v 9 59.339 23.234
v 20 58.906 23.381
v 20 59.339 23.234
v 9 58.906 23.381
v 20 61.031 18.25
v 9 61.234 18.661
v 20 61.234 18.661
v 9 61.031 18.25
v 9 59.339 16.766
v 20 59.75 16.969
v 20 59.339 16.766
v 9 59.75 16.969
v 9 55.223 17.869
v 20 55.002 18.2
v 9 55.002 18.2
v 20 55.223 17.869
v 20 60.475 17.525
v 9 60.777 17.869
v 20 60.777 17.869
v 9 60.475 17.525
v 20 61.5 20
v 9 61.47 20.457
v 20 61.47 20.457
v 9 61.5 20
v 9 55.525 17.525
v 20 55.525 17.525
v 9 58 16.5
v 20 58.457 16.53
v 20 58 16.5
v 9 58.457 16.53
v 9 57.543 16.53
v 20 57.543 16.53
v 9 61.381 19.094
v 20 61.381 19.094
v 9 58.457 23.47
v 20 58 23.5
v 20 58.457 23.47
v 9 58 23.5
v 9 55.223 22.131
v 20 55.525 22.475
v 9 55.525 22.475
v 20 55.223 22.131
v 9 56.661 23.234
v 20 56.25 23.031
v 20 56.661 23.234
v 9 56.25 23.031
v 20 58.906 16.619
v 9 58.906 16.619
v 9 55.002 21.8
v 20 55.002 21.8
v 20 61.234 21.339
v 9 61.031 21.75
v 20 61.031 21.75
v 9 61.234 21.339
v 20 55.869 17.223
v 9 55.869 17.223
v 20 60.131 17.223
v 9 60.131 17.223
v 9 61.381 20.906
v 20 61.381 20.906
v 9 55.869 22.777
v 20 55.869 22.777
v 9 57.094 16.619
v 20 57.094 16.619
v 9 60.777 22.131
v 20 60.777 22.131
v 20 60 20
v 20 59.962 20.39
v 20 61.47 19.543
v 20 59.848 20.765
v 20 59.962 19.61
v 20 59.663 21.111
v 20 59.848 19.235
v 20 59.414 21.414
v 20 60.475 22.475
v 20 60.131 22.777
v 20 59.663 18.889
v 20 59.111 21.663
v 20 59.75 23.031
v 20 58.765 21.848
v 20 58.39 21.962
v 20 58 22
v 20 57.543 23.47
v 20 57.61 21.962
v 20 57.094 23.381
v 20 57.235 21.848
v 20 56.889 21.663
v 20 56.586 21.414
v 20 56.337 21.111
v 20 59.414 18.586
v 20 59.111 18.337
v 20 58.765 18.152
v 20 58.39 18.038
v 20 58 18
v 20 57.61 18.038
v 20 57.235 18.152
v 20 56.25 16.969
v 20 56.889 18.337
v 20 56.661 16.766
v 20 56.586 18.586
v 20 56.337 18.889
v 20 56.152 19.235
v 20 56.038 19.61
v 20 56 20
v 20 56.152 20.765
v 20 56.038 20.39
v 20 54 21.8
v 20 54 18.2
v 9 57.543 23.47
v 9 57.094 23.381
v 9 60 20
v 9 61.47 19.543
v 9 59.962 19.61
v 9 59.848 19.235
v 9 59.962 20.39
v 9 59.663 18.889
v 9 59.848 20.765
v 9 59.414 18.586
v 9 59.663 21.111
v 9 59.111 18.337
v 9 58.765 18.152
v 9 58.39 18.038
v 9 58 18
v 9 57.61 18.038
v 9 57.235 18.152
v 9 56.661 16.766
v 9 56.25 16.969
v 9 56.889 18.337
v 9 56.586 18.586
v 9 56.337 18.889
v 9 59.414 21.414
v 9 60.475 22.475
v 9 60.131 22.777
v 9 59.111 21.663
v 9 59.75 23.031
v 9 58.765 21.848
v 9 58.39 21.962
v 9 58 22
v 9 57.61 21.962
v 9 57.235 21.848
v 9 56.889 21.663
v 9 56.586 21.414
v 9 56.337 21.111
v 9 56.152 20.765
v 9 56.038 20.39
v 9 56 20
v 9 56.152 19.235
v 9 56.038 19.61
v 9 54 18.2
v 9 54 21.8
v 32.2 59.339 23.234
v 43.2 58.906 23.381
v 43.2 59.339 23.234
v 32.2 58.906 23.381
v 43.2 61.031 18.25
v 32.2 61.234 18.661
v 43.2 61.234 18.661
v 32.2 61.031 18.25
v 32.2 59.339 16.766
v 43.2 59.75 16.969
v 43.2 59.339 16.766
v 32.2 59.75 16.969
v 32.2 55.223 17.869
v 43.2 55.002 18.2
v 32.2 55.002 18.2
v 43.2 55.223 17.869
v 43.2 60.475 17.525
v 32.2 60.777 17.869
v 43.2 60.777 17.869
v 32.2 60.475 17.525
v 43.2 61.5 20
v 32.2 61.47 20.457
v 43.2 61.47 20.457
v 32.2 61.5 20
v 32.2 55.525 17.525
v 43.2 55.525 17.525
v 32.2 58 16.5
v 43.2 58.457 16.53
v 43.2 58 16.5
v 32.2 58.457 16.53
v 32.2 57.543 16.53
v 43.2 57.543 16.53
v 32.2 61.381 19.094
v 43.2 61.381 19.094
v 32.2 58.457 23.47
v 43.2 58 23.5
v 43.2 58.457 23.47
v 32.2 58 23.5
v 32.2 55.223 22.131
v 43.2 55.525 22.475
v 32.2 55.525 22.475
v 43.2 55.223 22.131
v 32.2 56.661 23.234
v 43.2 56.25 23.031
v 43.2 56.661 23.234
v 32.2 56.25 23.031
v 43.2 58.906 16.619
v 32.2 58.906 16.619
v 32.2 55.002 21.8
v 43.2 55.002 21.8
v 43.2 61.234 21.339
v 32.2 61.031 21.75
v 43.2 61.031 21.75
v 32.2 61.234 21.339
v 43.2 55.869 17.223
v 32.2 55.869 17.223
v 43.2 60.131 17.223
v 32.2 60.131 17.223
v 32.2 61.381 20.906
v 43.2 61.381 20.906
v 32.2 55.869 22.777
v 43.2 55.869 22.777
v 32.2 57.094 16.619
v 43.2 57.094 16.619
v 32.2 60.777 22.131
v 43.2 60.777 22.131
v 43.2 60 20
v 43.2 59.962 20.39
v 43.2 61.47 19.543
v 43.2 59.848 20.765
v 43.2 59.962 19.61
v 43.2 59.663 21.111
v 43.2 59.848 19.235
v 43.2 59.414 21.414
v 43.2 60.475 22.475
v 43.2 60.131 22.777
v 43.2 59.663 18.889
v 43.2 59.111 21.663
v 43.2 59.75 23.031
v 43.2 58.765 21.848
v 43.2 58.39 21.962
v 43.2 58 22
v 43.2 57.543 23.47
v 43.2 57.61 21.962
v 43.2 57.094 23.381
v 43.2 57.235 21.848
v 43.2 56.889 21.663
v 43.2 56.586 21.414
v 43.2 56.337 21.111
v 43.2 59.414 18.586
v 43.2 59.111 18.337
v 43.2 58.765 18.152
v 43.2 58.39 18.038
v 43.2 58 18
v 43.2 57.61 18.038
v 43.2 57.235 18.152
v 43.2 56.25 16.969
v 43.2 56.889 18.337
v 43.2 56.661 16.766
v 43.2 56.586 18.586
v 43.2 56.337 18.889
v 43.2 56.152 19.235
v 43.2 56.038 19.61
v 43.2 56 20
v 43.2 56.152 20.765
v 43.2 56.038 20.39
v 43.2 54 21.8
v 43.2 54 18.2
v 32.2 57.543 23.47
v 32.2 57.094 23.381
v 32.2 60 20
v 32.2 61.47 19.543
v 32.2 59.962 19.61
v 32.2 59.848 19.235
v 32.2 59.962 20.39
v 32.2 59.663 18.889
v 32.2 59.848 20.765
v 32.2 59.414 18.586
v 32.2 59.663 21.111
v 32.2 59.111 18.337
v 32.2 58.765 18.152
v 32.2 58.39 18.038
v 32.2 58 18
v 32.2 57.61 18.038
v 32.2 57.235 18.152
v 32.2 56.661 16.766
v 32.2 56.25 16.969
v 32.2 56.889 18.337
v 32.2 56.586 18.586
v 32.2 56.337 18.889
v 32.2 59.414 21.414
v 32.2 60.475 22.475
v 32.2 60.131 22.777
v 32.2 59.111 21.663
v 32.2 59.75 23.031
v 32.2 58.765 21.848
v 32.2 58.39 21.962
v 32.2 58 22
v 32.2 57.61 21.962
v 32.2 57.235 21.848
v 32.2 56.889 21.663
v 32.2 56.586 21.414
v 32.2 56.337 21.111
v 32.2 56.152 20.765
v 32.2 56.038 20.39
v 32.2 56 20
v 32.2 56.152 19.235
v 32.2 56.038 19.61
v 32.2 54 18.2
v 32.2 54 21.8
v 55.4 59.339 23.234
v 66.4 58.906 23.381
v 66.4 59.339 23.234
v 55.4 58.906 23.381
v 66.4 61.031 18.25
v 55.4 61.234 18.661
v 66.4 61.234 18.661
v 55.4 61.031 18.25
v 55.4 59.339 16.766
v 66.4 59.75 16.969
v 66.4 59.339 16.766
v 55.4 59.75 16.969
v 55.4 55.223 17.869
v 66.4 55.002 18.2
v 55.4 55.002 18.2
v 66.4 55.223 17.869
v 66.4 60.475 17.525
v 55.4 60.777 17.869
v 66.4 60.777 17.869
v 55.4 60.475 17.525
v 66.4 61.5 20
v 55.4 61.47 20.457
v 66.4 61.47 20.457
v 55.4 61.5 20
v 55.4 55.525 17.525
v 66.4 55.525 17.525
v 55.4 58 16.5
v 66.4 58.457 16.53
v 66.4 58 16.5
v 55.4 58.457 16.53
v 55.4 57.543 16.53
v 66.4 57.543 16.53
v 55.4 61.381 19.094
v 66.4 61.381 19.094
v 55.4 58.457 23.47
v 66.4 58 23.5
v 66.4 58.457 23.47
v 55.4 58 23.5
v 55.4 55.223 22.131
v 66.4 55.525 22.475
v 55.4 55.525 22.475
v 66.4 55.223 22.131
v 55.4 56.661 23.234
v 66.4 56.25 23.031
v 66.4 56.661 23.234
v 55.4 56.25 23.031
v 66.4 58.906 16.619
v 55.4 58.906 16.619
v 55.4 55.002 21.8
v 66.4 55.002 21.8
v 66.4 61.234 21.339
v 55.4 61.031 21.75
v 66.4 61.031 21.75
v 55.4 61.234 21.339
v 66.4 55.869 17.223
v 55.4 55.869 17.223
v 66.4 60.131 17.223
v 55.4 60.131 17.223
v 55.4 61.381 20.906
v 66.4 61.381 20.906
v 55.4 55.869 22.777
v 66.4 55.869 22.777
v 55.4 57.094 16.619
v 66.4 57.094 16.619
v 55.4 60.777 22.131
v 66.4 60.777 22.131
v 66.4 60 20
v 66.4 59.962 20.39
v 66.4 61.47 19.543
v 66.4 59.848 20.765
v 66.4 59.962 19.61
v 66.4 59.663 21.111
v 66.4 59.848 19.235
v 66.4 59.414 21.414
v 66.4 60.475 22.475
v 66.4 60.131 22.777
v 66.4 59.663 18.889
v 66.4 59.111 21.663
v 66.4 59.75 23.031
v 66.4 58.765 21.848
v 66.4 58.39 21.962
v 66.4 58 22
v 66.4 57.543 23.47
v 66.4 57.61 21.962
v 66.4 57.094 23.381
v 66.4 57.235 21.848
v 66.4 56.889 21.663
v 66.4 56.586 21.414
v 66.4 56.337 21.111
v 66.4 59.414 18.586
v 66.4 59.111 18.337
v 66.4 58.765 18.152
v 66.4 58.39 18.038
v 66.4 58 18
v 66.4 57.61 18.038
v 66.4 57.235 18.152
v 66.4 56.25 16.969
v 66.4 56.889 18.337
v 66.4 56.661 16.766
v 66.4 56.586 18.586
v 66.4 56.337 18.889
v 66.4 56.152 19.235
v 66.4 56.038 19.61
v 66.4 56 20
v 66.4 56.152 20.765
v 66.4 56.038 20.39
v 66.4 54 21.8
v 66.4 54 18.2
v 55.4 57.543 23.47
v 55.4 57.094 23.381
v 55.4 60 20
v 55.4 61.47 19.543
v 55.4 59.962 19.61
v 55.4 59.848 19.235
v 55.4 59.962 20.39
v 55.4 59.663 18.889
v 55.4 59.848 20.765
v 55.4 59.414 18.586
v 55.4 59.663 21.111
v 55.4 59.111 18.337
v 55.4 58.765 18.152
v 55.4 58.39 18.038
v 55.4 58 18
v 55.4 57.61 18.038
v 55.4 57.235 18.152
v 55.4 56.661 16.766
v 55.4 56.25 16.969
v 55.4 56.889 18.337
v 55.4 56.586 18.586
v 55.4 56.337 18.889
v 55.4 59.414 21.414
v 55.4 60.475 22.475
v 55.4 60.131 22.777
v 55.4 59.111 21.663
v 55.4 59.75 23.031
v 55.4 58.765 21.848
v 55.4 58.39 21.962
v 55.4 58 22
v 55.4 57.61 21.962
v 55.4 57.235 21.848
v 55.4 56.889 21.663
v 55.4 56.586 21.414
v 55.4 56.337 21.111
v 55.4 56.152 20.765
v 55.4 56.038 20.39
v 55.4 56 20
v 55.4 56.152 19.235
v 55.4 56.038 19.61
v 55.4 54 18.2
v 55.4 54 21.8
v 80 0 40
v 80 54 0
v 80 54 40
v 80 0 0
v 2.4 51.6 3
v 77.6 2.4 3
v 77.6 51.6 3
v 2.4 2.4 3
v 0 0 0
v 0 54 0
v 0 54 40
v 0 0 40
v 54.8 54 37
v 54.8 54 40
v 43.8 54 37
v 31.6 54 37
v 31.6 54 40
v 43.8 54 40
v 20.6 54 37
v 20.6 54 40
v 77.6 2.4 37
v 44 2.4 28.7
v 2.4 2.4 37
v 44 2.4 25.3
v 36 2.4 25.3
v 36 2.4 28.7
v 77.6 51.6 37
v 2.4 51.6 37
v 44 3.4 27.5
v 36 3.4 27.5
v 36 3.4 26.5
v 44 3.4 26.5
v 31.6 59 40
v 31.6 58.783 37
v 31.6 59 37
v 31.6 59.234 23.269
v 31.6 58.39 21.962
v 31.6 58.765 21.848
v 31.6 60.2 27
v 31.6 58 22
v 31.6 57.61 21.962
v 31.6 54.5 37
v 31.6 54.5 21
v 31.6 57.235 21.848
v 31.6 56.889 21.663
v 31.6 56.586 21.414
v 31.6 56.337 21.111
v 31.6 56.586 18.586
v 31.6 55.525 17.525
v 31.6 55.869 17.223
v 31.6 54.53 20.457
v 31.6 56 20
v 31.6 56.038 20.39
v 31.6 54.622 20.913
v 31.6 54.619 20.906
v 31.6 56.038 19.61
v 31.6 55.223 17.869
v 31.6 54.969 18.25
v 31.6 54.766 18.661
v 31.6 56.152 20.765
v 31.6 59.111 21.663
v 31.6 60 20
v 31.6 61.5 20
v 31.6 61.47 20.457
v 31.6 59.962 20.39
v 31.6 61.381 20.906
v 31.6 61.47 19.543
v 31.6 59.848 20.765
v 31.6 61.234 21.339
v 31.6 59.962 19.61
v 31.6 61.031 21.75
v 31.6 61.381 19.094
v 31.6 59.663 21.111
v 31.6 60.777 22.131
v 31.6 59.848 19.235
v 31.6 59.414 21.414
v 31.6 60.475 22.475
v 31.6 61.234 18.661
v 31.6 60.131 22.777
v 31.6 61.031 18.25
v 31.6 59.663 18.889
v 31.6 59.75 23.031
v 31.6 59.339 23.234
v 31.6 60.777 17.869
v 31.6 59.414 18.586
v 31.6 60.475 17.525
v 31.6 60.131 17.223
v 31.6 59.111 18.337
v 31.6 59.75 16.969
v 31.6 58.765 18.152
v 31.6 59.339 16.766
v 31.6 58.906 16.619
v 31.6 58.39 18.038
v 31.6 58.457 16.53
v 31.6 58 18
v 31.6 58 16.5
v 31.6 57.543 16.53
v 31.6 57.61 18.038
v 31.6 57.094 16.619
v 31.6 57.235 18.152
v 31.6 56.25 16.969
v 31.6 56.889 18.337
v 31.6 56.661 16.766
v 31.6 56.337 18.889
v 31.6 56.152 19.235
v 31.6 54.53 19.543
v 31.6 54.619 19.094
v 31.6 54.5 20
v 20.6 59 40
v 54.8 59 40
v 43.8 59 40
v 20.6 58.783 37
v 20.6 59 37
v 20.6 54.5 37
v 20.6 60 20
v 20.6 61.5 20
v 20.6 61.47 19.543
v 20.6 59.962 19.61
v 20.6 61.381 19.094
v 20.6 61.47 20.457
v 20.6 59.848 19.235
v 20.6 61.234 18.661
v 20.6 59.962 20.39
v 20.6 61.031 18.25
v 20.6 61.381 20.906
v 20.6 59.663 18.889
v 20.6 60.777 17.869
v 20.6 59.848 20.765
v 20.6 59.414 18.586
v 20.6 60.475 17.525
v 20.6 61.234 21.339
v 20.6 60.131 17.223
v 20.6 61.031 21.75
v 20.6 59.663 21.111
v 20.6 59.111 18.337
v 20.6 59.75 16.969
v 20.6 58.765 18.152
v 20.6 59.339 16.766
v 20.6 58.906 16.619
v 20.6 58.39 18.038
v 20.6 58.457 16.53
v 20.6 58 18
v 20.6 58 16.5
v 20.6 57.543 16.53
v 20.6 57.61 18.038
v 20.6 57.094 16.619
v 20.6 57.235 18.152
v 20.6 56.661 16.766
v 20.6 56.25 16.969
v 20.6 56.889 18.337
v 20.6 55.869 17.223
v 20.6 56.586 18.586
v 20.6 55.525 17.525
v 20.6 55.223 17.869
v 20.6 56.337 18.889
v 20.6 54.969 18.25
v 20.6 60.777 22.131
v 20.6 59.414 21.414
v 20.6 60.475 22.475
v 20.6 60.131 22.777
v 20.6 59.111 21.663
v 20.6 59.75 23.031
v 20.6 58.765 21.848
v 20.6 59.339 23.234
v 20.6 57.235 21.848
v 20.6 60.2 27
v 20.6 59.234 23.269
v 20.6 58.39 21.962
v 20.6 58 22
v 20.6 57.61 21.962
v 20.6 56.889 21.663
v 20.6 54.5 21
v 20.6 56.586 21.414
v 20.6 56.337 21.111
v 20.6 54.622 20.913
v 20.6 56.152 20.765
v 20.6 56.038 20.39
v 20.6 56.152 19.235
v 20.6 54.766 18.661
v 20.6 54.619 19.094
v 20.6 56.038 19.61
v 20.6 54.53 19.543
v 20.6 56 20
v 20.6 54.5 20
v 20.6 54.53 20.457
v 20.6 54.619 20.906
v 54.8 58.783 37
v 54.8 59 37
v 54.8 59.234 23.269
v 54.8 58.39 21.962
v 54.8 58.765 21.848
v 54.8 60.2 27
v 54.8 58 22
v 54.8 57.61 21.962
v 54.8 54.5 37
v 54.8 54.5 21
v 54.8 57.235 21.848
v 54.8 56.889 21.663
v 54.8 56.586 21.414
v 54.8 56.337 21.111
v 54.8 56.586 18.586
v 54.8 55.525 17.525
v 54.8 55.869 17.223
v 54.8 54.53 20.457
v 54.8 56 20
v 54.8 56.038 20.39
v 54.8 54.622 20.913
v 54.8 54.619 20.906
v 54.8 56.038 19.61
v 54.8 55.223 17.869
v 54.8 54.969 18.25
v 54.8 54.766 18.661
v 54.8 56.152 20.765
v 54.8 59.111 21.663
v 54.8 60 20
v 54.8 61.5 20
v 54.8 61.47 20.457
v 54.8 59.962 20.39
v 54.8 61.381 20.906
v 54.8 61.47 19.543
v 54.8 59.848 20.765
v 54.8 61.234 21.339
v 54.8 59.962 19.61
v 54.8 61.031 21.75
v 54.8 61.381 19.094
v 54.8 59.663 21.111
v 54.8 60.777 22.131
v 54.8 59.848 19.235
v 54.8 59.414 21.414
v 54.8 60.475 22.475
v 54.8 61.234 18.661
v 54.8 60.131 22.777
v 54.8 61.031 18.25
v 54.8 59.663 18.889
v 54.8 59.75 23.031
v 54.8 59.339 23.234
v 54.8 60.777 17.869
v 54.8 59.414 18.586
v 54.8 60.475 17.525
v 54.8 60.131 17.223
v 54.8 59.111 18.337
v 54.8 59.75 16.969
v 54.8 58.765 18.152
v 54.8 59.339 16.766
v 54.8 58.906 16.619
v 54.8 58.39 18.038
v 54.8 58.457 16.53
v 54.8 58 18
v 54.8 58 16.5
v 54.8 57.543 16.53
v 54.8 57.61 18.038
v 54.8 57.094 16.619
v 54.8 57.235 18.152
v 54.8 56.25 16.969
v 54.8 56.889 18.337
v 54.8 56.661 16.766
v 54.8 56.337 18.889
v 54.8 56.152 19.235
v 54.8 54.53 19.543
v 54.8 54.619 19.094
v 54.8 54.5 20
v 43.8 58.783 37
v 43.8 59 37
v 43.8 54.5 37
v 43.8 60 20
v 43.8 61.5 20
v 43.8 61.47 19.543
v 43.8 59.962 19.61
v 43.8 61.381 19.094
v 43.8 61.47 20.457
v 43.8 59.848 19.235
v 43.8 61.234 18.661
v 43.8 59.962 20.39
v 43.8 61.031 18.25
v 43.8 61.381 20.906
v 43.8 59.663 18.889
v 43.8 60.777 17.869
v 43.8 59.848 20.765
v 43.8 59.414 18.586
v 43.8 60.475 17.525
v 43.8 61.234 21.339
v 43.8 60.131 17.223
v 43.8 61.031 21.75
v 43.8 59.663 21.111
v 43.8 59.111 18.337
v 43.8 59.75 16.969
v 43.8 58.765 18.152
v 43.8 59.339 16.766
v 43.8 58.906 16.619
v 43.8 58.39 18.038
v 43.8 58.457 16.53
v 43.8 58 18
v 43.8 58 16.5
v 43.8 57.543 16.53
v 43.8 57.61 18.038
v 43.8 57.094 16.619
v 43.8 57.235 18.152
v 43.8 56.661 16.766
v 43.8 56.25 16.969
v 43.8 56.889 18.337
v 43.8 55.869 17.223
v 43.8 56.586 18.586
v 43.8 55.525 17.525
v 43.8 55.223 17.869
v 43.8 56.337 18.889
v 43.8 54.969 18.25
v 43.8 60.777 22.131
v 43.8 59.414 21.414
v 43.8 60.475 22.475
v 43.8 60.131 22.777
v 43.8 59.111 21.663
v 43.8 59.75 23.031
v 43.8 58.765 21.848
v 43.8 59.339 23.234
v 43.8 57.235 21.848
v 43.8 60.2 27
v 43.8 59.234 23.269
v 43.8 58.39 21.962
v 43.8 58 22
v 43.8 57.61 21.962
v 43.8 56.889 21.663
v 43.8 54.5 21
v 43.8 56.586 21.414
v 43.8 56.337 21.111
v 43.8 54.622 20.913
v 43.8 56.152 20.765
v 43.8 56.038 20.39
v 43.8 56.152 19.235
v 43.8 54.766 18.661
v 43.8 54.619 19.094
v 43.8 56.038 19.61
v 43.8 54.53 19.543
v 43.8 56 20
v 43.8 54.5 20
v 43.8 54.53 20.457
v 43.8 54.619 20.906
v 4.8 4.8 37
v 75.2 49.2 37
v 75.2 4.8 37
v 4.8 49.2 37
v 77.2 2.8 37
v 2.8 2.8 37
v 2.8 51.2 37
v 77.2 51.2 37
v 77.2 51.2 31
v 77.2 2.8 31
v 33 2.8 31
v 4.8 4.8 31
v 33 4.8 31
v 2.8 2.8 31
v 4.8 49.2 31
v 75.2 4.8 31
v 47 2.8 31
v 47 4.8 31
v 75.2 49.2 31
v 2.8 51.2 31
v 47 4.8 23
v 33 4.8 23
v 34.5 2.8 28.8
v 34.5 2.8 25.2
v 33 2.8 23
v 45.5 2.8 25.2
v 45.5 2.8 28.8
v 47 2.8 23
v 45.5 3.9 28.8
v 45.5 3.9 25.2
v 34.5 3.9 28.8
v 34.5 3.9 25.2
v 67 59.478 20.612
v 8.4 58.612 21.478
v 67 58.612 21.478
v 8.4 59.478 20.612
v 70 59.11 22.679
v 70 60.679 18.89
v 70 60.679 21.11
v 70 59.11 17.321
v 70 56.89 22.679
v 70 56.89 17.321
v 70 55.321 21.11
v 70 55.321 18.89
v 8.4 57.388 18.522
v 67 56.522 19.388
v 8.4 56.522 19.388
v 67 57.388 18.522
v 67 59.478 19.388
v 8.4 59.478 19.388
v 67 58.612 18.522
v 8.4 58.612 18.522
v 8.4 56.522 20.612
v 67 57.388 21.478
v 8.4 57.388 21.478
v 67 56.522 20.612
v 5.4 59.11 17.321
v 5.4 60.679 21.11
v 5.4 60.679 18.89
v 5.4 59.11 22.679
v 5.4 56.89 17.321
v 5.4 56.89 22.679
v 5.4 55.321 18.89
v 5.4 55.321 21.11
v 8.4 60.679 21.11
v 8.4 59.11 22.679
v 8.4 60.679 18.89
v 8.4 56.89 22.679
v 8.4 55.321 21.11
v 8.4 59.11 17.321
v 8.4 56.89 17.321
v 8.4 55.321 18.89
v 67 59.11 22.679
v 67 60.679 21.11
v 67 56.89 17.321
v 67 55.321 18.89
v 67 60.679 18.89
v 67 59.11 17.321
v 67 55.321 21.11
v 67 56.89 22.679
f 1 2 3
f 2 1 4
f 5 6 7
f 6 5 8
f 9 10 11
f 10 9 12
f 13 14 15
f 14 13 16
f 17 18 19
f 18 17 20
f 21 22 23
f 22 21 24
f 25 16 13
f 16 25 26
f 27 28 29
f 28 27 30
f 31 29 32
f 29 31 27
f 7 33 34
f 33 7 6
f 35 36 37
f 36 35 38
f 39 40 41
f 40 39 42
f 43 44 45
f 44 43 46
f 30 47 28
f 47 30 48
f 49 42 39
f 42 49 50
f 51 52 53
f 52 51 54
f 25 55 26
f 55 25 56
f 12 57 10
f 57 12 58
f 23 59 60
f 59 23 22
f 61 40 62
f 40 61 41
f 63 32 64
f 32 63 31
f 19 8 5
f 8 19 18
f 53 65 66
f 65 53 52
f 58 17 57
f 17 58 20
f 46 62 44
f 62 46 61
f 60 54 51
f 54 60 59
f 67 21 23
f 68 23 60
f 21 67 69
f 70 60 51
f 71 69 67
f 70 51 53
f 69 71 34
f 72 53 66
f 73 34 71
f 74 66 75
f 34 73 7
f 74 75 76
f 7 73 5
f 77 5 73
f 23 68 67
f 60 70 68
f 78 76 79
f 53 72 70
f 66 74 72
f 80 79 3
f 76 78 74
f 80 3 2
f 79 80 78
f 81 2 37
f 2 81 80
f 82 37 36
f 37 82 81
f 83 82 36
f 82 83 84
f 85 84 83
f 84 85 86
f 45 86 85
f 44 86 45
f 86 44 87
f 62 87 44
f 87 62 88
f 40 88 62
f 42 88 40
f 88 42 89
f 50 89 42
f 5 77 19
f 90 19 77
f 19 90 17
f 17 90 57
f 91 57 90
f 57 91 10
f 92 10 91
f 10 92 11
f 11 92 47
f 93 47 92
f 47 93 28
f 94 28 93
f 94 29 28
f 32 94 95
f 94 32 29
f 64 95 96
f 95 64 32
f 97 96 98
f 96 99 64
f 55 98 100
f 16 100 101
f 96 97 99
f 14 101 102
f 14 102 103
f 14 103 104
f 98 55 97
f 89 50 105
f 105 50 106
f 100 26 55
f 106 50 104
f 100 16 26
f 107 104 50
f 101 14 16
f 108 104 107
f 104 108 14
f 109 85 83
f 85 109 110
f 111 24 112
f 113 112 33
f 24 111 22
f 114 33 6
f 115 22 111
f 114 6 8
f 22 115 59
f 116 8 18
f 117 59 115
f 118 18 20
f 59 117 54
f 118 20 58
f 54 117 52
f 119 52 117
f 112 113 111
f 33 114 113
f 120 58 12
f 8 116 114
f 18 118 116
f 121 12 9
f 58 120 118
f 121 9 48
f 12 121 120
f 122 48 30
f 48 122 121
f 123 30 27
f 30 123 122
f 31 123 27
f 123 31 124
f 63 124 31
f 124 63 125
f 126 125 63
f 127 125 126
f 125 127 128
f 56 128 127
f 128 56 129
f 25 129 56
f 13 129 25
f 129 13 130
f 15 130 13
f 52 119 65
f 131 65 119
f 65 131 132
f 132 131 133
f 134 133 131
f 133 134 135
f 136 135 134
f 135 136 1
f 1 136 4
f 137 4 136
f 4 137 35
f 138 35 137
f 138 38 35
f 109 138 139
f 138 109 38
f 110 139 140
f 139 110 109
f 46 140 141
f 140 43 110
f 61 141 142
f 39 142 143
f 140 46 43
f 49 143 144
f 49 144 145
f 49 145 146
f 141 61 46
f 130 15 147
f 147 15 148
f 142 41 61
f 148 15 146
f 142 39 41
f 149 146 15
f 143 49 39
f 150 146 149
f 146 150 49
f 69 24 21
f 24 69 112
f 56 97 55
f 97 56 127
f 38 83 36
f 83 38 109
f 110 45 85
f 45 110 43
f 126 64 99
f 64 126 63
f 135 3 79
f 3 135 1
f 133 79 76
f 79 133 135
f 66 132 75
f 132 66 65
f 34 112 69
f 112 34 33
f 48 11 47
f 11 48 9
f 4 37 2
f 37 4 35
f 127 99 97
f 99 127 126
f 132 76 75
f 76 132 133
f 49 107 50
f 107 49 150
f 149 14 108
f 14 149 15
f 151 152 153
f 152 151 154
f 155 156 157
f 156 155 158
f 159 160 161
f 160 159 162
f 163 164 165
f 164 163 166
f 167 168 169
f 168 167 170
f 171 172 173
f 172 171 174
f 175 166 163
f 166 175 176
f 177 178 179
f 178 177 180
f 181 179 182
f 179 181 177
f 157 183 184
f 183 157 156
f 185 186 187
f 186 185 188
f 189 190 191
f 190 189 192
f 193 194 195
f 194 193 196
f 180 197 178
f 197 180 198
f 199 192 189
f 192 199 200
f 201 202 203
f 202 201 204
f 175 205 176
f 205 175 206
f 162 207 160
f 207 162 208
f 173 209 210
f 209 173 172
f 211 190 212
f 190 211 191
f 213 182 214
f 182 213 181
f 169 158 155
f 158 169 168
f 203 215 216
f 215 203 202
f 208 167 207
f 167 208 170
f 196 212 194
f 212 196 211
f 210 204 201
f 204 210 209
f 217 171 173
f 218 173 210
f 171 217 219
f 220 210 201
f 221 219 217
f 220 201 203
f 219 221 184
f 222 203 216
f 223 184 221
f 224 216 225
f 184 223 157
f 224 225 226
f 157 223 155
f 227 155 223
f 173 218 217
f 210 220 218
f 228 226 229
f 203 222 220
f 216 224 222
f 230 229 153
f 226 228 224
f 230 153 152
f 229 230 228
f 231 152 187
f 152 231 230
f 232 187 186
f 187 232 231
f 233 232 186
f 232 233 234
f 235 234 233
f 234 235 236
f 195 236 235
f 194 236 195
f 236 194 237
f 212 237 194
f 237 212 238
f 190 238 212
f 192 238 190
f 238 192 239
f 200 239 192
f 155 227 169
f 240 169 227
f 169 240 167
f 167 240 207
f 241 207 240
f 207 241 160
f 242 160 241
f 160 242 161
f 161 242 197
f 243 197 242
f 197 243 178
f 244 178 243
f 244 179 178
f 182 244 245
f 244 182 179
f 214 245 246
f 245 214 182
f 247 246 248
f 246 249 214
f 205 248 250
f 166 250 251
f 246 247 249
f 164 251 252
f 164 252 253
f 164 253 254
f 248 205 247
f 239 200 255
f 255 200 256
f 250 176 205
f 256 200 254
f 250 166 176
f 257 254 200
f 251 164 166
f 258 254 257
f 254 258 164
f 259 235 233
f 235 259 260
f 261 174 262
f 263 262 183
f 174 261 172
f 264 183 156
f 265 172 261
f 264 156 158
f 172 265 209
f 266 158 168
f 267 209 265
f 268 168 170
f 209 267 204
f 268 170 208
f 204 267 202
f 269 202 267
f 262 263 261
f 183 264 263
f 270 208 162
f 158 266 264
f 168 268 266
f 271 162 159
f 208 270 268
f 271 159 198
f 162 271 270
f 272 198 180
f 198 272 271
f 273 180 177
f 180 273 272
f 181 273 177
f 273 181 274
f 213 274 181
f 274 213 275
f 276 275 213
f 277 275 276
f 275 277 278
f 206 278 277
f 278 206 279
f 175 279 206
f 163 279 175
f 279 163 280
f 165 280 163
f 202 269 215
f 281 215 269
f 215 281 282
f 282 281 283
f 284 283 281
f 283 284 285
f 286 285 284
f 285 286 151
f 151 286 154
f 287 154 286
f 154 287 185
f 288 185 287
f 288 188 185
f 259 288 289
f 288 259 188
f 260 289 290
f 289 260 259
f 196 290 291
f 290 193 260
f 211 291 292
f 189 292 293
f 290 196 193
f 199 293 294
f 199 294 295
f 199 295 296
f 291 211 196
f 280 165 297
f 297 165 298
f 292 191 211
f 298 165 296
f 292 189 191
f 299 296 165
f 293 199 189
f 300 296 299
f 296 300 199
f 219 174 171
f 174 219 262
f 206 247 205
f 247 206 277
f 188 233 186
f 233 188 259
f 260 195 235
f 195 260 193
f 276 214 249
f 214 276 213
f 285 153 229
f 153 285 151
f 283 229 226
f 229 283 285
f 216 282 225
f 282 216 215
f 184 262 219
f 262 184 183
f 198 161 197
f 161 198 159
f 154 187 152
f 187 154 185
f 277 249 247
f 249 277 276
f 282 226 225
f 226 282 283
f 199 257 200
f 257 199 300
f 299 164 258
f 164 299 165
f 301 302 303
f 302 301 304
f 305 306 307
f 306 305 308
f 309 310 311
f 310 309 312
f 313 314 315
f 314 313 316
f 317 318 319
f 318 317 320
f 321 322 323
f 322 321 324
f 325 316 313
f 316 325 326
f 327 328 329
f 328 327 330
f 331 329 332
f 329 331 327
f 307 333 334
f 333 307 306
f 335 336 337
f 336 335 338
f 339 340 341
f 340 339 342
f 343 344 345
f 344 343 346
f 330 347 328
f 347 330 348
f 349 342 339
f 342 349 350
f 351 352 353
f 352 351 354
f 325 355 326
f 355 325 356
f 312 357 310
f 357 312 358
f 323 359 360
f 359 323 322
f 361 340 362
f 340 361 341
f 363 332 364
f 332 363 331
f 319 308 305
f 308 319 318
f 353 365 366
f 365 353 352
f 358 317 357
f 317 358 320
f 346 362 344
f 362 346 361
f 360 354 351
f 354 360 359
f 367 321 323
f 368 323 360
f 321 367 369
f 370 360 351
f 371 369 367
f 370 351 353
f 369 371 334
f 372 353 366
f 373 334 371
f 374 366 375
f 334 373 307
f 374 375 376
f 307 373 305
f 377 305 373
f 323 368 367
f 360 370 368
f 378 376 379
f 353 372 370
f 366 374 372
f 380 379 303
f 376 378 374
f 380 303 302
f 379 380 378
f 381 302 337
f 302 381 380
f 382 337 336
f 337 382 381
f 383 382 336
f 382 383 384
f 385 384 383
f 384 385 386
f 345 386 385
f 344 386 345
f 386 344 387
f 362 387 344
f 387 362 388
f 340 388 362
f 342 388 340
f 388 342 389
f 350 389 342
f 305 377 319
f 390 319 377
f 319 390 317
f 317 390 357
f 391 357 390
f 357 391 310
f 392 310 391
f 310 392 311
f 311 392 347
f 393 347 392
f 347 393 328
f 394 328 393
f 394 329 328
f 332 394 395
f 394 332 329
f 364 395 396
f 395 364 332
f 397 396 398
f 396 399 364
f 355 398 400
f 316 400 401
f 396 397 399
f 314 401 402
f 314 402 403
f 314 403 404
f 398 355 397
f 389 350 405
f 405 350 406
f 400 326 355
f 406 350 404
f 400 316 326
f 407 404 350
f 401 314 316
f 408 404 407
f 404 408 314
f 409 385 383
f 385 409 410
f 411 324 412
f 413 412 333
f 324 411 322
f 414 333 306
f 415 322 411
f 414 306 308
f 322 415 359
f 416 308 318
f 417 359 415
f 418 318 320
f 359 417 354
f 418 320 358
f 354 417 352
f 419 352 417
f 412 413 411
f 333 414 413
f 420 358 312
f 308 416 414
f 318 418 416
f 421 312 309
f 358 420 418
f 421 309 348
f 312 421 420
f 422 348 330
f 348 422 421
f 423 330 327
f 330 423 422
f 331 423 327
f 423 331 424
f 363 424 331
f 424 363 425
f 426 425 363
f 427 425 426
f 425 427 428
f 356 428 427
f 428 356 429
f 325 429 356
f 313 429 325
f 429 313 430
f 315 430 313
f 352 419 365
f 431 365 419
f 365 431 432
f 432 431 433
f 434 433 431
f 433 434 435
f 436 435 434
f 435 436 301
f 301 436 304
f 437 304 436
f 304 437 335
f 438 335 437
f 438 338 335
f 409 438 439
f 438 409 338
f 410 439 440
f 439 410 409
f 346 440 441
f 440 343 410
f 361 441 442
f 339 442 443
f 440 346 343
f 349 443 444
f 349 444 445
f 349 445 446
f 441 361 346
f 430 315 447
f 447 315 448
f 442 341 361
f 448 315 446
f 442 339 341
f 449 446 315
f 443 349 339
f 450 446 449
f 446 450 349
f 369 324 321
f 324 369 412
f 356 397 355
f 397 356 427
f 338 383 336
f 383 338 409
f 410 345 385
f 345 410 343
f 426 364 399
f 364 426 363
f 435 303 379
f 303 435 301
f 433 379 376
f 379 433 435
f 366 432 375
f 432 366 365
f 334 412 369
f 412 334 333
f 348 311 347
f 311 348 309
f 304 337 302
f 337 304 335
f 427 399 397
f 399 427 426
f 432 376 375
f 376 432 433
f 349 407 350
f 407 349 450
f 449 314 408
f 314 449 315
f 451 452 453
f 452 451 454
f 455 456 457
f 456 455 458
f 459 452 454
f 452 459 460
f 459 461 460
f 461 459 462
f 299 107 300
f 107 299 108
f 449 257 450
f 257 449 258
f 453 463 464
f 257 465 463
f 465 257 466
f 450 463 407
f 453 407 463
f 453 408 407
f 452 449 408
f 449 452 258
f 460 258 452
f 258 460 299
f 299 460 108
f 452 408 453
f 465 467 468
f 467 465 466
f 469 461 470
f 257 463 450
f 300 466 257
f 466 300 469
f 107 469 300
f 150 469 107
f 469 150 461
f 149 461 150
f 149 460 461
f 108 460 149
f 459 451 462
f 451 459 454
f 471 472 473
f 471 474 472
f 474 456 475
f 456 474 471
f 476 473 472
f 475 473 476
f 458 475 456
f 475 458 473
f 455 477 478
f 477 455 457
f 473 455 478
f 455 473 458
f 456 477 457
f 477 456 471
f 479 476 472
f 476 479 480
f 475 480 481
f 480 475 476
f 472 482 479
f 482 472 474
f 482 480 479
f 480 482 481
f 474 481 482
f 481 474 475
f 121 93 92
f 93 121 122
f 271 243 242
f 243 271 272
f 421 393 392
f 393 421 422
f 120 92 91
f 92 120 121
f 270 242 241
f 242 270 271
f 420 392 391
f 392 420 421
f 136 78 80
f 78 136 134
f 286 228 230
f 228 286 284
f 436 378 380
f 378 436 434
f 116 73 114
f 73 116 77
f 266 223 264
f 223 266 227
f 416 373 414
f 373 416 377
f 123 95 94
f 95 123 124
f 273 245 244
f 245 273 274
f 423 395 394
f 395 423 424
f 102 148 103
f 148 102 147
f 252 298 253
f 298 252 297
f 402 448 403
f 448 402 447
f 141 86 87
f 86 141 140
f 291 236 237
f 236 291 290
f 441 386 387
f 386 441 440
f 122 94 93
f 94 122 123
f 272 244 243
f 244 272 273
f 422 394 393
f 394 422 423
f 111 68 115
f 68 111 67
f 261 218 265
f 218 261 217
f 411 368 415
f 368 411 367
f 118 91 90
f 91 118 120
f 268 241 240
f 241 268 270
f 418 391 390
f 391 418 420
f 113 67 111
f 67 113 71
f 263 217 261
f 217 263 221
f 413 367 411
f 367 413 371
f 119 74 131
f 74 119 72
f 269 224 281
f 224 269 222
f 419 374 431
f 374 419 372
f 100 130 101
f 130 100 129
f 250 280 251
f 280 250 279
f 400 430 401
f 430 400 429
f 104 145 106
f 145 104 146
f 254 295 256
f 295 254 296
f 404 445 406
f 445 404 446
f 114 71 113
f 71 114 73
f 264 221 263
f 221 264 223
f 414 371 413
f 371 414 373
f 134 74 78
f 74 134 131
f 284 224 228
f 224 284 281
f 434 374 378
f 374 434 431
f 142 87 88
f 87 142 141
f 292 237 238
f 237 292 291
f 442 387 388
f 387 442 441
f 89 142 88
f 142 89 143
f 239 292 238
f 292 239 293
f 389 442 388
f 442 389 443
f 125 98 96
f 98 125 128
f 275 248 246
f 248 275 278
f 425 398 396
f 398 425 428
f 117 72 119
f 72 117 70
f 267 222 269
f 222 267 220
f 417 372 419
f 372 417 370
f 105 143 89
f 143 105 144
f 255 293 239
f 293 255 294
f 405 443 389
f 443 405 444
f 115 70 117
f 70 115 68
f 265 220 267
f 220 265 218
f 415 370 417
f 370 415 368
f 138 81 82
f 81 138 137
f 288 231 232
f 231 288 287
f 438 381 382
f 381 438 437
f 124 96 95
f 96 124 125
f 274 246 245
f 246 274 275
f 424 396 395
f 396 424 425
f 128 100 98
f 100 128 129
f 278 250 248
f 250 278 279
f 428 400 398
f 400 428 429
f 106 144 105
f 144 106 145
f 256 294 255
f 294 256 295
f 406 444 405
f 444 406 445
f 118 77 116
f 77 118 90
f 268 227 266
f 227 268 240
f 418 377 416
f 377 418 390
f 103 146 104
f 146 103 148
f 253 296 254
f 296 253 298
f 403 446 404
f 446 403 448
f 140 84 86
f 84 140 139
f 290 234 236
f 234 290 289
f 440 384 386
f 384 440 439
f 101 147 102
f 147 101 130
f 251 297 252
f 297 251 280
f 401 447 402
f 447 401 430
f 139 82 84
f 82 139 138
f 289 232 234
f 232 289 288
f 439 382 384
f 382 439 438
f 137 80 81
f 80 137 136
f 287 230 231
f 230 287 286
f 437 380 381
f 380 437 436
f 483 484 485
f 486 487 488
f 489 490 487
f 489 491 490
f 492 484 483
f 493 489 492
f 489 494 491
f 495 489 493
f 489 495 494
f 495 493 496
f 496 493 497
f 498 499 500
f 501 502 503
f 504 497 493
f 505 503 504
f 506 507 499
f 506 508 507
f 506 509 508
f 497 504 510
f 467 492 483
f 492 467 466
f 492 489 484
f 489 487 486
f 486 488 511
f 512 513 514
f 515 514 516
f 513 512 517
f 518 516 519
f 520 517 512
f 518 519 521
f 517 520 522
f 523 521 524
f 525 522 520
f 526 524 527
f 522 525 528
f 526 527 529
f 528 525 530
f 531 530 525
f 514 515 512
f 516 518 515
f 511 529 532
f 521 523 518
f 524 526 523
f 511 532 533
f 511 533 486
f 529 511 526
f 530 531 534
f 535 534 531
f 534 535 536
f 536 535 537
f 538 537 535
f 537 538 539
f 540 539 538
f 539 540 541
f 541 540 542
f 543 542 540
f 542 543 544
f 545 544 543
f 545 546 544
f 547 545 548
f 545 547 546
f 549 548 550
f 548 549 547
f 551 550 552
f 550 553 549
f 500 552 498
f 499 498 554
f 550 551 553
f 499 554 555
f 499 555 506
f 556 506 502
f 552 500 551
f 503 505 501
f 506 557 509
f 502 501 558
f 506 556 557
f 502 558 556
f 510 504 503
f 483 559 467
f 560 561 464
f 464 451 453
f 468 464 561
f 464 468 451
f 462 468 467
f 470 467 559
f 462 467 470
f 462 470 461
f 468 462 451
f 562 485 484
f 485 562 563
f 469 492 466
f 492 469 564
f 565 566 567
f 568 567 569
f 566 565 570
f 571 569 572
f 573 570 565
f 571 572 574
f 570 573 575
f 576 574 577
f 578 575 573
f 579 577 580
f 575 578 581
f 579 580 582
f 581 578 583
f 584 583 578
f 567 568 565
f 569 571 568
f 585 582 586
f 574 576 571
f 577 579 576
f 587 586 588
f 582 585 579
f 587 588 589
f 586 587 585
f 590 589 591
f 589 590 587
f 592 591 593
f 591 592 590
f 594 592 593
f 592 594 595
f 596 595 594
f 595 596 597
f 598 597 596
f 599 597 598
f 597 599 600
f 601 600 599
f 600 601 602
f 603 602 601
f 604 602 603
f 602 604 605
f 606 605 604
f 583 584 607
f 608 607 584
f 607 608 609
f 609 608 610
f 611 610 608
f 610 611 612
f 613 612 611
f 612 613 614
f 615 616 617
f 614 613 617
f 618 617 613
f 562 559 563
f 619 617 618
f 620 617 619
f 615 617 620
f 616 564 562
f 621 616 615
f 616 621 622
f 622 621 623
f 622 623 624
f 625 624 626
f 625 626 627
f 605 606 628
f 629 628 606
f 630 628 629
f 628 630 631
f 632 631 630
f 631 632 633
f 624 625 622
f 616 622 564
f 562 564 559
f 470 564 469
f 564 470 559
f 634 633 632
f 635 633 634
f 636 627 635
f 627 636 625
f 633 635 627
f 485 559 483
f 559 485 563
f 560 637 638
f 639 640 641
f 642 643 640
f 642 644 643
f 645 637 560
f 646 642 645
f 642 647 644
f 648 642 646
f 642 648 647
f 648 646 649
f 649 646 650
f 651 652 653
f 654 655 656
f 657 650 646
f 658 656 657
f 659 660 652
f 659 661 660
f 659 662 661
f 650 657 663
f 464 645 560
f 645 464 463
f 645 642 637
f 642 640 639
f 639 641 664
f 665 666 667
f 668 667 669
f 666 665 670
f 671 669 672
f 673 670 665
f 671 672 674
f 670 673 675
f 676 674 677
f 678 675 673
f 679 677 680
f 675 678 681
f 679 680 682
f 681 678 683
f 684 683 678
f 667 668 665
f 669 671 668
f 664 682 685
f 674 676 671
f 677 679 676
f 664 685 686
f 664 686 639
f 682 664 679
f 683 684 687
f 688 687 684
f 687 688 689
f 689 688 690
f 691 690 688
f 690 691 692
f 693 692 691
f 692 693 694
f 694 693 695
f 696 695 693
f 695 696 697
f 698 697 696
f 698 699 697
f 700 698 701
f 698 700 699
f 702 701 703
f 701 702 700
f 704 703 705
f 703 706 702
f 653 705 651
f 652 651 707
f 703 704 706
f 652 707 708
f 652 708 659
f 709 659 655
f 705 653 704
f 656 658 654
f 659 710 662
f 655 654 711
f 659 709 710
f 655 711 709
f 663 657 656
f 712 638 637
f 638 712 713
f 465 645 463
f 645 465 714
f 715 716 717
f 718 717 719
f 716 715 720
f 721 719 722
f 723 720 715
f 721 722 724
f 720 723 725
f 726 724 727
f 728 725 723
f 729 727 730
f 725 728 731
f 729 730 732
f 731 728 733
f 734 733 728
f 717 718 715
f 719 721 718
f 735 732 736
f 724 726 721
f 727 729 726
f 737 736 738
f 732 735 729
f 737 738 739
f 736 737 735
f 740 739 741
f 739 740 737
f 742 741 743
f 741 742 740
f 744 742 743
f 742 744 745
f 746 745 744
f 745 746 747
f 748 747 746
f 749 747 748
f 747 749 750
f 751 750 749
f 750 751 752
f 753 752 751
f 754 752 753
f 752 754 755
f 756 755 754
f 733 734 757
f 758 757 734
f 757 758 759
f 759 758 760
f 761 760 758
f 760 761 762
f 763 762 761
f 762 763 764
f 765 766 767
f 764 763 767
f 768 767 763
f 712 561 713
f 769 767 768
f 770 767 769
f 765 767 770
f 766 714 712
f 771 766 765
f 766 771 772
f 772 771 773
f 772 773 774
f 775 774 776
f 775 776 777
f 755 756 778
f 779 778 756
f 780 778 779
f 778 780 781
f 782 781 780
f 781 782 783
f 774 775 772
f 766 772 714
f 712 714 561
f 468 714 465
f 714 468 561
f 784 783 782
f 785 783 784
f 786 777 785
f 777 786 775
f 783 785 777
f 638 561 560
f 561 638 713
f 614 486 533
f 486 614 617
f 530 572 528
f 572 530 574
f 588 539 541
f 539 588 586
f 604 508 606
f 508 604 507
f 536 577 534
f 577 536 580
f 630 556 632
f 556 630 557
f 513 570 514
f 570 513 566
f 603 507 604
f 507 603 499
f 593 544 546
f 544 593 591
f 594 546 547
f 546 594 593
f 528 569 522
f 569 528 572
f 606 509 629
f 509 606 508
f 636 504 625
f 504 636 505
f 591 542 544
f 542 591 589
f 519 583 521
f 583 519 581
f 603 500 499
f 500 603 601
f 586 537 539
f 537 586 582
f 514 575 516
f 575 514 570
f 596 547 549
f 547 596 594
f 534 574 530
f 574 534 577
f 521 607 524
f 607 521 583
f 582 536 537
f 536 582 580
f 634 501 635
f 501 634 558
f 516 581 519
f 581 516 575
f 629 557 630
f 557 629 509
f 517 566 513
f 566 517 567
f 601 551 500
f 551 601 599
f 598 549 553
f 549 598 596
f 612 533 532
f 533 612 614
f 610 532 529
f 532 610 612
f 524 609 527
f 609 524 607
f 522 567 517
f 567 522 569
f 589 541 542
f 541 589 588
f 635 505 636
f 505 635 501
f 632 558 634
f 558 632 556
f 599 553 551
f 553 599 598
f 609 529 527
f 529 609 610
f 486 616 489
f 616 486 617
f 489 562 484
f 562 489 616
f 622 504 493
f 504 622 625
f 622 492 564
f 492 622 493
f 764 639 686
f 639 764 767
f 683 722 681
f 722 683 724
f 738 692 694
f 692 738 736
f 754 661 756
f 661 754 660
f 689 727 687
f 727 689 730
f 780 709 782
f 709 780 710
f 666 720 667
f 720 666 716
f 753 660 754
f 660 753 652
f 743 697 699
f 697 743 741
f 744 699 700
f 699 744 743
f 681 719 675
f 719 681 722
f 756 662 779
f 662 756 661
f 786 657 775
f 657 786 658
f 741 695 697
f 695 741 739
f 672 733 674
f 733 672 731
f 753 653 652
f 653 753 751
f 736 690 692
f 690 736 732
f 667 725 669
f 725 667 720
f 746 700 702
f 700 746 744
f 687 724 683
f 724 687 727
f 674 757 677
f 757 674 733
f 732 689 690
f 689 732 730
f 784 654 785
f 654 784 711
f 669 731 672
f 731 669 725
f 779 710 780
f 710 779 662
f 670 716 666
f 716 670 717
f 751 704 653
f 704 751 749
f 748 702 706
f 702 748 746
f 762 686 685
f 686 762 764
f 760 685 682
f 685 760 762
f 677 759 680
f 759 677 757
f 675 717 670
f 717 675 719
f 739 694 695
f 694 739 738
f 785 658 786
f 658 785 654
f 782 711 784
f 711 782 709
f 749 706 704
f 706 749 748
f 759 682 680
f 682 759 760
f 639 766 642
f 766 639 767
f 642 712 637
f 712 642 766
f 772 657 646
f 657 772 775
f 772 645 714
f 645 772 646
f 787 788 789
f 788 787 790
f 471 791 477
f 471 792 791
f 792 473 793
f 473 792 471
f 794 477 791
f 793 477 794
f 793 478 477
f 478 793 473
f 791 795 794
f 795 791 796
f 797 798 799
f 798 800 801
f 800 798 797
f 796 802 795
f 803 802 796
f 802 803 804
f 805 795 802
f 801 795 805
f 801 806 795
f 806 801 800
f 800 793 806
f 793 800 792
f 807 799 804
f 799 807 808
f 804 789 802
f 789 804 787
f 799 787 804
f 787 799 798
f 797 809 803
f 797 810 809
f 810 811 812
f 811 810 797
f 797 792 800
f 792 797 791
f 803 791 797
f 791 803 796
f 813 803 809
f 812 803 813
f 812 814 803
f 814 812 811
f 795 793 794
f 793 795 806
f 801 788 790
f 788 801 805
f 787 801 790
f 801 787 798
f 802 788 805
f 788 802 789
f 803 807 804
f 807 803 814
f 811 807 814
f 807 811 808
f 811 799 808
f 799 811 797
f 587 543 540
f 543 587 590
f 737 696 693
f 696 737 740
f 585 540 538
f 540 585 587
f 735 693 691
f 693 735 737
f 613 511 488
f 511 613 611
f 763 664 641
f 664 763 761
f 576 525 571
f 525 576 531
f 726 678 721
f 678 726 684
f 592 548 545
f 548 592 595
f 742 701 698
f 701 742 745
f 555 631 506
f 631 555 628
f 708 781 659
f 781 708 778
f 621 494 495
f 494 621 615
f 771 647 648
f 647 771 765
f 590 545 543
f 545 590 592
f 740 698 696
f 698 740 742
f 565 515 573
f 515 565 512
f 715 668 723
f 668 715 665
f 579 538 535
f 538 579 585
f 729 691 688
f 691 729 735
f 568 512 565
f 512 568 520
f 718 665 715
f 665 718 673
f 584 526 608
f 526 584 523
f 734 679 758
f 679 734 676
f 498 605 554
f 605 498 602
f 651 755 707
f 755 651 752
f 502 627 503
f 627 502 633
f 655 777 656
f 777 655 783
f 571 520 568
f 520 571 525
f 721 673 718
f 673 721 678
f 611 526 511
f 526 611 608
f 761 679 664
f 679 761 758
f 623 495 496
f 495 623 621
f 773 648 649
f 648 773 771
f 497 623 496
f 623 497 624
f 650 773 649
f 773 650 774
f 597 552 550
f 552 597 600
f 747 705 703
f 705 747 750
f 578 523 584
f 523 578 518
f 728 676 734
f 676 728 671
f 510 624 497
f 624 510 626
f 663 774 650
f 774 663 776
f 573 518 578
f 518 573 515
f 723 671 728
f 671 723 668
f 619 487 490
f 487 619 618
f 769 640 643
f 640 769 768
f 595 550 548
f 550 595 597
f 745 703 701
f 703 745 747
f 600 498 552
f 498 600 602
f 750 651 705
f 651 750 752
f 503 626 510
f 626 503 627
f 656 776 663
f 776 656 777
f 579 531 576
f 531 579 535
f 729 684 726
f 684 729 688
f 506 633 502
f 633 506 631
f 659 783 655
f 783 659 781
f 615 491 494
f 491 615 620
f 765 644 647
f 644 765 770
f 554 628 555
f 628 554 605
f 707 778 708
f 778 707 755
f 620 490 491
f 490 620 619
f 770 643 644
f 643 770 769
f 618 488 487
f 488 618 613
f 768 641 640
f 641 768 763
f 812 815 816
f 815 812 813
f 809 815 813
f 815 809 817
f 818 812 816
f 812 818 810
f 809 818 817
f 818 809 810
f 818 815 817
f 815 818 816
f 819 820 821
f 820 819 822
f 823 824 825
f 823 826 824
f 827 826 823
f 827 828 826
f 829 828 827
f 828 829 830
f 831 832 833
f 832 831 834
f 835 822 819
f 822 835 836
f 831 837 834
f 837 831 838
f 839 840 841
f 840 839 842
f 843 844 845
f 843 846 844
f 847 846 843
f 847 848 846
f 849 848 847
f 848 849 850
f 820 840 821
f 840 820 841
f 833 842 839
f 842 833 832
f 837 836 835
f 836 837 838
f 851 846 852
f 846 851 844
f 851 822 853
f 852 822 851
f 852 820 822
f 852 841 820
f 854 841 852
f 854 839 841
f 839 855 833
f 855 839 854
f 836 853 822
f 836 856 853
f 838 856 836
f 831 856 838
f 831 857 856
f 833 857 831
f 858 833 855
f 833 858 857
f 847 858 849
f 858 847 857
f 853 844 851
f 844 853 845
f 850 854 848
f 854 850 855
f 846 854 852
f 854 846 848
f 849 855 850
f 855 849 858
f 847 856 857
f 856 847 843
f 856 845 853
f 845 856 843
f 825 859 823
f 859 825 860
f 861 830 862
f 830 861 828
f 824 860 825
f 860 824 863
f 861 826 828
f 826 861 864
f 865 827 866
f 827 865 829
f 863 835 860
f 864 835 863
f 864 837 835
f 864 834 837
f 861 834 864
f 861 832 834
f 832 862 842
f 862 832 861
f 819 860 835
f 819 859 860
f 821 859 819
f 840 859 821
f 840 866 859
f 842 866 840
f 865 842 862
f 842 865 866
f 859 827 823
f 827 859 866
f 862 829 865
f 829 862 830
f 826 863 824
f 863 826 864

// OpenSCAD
// Box with print-in-place hinge
// Closed body 80 (x) x 54 (y body, 61.5 incl. hinge) x 40 (z) mm.
// Lid occupies the top 10 mm. Hinge pin axis: y=58, z=20 (mid-height at the
// back), so swinging the lid -180 deg about that axis lays the lid flat on
// the bed behind the box: that is the print-in-place pose.
// Clearances (PLA, 0.4 nozzle): pin/bore 0.40 radial, knuckle axial gaps
// 0.6, lid lip to box walls 0.4, lid barrels to box back wall 0.5.

part = "assembly"; // ["assembly", "box", "lid", "pin"]
cadverify_only = "";

W = 80; D = 54; H = 40; box_h = 30;
wall = 2.4; floor_t = 3; plate_t = 3;
hinge_y = 58; hinge_z = 20;
barrel_r = 3.5; bore_r = 2.0; pin_r = 1.6; cap_r = 2.9;
hinge_ymax = hinge_y + barrel_r;          // 61.5
box_segs  = [[9, 11], [32.2, 11], [55.4, 11]];   // [x0, len]
lid_segs  = [[20.6, 11], [43.8, 11]];
pin_x0 = 5.4; pin_len = 64.6;

module instance(name, partname, unit = 1) {
    echo(cadverify_instance = [name, partname, unit]);
    if (cadverify_only == "" || cadverify_only == name) children();
}

// Extrude a (y,z) profile along +x starting at x0, offset by (oy,oz).
module extrude_yz(profile, x0, len, oy = 0, oz = 0) {
    multmatrix([[0,0,1,x0],[1,0,0,oy],[0,1,0,oz],[0,0,0,1]])
        linear_extrude(height = len) polygon(points = profile);
}

module barrel(x0, len) {
    translate([x0, hinge_y, hinge_z]) rotate([0, 90, 0])
        cylinder(h = len, r = barrel_r, $fn = 48);
}

module bore_cut() {
    translate([4, hinge_y, hinge_z]) rotate([0, 90, 0])
        cylinder(h = 72, r = bore_r, $fn = 32);
}

module box_closed() {
    difference() {
        union() {
            // floor and walls up to z=30
            translate([0, 0, 0]) cube([W, D, floor_t]);
            translate([0, 0, floor_t]) cube([W, wall, box_h - floor_t]);              // front
            translate([0, D - wall, floor_t]) cube([W, wall, box_h - floor_t]);       // back
            translate([0, wall, floor_t]) cube([wall, D - 2*wall, box_h - floor_t]);  // left
            translate([W - wall, wall, floor_t]) cube([wall, D - 2*wall, box_h - floor_t]); // right
            // front catch detent bump on the inner front wall (wedged ridge)
            extrude_yz([[2.4,25.3],[3.4,26.5],[3.4,27.5],[2.4,28.7]], 36, 8);
            // hinge knuckles + arms to the back wall
            for (s = box_segs) {
                barrel(s[0], s[1]);
                translate([s[0], 53.5, hinge_z - 1.8]) cube([s[1], 5, 3.6]);
            }
        }
        bore_cut();
    }
}

module lid_closed() {
    difference() {
        union() {
            // top plate + back hinge tabs
            translate([0, 0, H - plate_t]) cube([W, D, plate_t]);
            for (s = lid_segs) translate([s[0], 53, H - plate_t]) cube([s[1], 6, plate_t]);
            // external skirt (down to z=30, flush with box walls outside)
            translate([0, 0, box_h]) cube([W, wall, H - plate_t - box_h]);                  // front
            translate([0, D - wall, box_h]) cube([W, wall, H - plate_t - box_h]);           // back
            translate([0, wall, box_h]) cube([wall, D - 2*wall, H - plate_t - box_h]);      // left
            translate([W - wall, wall, box_h]) cube([wall, D - 2*wall, H - plate_t - box_h]); // right
            // inner sealing lip (0.4 clear of box inner walls)
            translate([2.8, 2.8, 31]) cube([74.4, 2, 6]);        // front lip
            translate([2.8, 49.2, 31]) cube([74.4, 2, 6]);       // back lip
            translate([2.8, 4.8, 31]) cube([2, 44.4, 6]);        // left lip
            translate([75.2, 4.8, 31]) cube([2, 44.4, 6]);       // right lip
            // central catch tongue on the front lip, reaching down to z=23
            translate([33, 2.8, 23]) cube([14, 2, 8]);
            // hinge knuckles + diagonal straps up to the plate tabs
            for (s = lid_segs) {
                barrel(s[0], s[1]);
                extrude_yz([[54.5,39],[58.5,39],[60.2,27],[58,18.5],[54.5,21]], s[0], s[1]);
            }
        }
        bore_cut();
        // catch groove in the tongue (receives the box detent bump when shut)
        translate([34.5, 2.7, 25.2]) cube([11, 1.2, 3.6]);
        // fingernail scoop in the front skirt bottom edge
        translate([40, -1, box_h]) rotate([90, 0, 0]) cylinder(h = 4, r = 4.5, $fn = 32);
    }
}

function oct_pts(r) = [for (i = [0:7]) let (a = 22.5 + 45*i) [r*cos(a), r*sin(a)]];

module pin_closed() {
    // stepped octagonal axle (flats top/bottom), captive caps both ends
    extrude_yz(oct_pts(pin_r), pin_x0, pin_len, hinge_y, hinge_z);
    extrude_yz(oct_pts(cap_r), pin_x0, 3, hinge_y, hinge_z);
    extrude_yz(oct_pts(cap_r), pin_x0 + pin_len - 3, 3, hinge_y, hinge_z);
}

// --- printed (as-exported) orientations ---
module lid_printed() {
    // closed lid rotated 180 deg about the hinge axis, then dropped to y=0
    translate([0, hinge_ymax, H]) rotate([180, 0, 0]) lid_closed();
}
pin_off = cap_r * cos(22.5); // 2.679 half-height of the octagonal caps
module pin_printed() {
    translate([-pin_x0, -(hinge_y - pin_off), -(hinge_z - pin_off)]) pin_closed();
}

box_spec = [
    ["bounds", [[0, 0, 0], [W, hinge_ymax, box_h]]],
    ["bodies", 1],
    ["support_faces", [["bed", "-z", 4000]]],
    ["overhangs_allowed", [
        ["hinge barrels and arms: horizontal print-in-place axle housings, bore is self-supported inside the tube", [[8, 53, 16], [67.5, 62, 24]]]
    ]],
    ["copies", 1],
    ["details", [
        ["floor", "material", [[10, 10, 0.5], [70, 44, 2.5]], 0.98],
        ["interior", "void", [[6, 6, 8], [74, 48, 24]], 0.98],
        ["front_wall", "thickness", [40, -1, 15], [0, 1, 0], 2.4],
        ["knuckle_arm", "material", [[10, 53.8, 18.8], [19, 55.8, 21.2]], 0.9],
        ["hinge_bore", "void", [[10, 56.7, 18.7], [19, 59.3, 21.3]], 1.0],
        ["catch_bump", "material", [[37, 2.6, 26.6], [43, 3.3, 27.4]], 0.85],
        ["catch_bump_view", "view", [[35, 2, 24], [45, 4.5, 29.5]]],
        ["hinge_view", "view", [[8, 53, 15], [67, 62, 25]]]
    ]]
];

lid_spec = [
    ["bounds", [[0, 0, 0], [W, hinge_ymax, 23.5]]],
    ["bodies", 1],
    ["support_faces", [["bed", "-z", 4000]]],
    ["overhangs_allowed", [
        ["hinge barrels and straps: horizontal print-in-place axle housings", [[20, 0, 0], [55.5, 8, 24]]],
        ["catch groove underside in print pose", [[34, 56, 11], [46, 59, 15]]]
    ]],
    ["copies", 1],
    ["details", [
        ["top_plate", "material", [[10, 17.5, 0.5], [70, 51.5, 2.5]], 0.98],
        ["front_skirt", "material", [[10, 59.3, 4.5], [70, 61.3, 7.5]], 0.9],
        ["plate_thickness", "thickness", [40, 30, -1], [0, 0, 1], 3],
        ["tongue", "material", [[38, 57, 9.2], [42, 58.5, 10.3]], 0.85],
        ["catch_groove", "void", [[37, 57.7, 12], [43, 58.5, 14]], 1.0],
        ["hinge_bore", "void", [[23, 2.2, 18.7], [29, 4.8, 21.3]], 1.0],
        ["strap", "material", [[23, 3.5, 8], [29, 6.5, 12]], 0.8],
        ["catch_groove_view", "view", [[33, 56.5, 9], [47, 59, 17]]],
        ["lid_knuckle_view", "view", [[20, 0, 16], [32, 8, 24]]]
    ]]
];

pin_spec = [
    ["bounds", [[0, 0, 0], [pin_len, 2*pin_off, 2*pin_off]]],
    ["bodies", 1],
    ["support_faces", [["bed", "-z", 12]]],
    ["overhangs_allowed", [
        ["lower facets of the horizontal print-in-place axle, 0.4 above the bore that supports it", [[-0.1, -0.1, -0.1], [64.7, 5.5, 1.6]]]
    ]],
    ["copies", 1],
    ["details", [
        ["shaft", "material", [[10, 1.8, 1.8], [50, 3.55, 3.55]], 0.9],
        ["cap", "material", [[0.5, 1.0, 1.0], [2.5, 4.35, 4.35]], 0.7],
        ["cap_thickness", "thickness", [1.5, pin_off, -1], [0, 0, 1], 5.358],
        ["pin_end_view", "view", [[0, 0, 0], [3, 5.36, 5.36]]]
    ]]
];

assembly_spec = [
    ["bounds", [[0, 0, 0], [W, hinge_ymax, H]]],
    ["support_faces", [["table", "-z", 4000]]],
    ["motions", [
        ["lid_swing", ["lid"], "rotate", [0, hinge_y, hinge_z], [1, 0, 0], [-180, 0],
            ["flex", [["lid", "box", 1.0, "front catch tongue snaps 0.6 mm over the detent bump while closing"]]]]
    ]],
    ["print_in_place", 0.4],
    ["print_pose", [["lid_swing", -180]]],
    ["overhangs_allowed", [
        ["box hinge barrels in print pose", [[8, 53, 16], [67.5, 62, 24]]],
        ["lid hinge barrels and straps in print pose", [[20, 53, 0], [56, 62, 24]]],
        ["horizontal pin inside its bore, 0.4 above the bore surface", [[5, 55, 16.5], [70.5, 61, 20]]],
        ["lid catch groove in print pose", [[33, 110, 2], [47, 114, 18]]]
    ]]
];

if (part == "box") {
    echo(cadverify_spec = box_spec);
    box_closed();
} else if (part == "lid") {
    echo(cadverify_spec = lid_spec);
    lid_printed();
} else if (part == "pin") {
    echo(cadverify_spec = pin_spec);
    pin_printed();
} else {
    echo(cadverify_spec = assembly_spec);
    instance("box", "box") box_closed();
    instance("lid", "lid")
        translate([0, hinge_ymax, H]) rotate([180, 0, 0]) lid_printed();
    instance("pin", "pin")
        translate([pin_x0, hinge_y - pin_off, hinge_z - pin_off]) pin_printed();
}
